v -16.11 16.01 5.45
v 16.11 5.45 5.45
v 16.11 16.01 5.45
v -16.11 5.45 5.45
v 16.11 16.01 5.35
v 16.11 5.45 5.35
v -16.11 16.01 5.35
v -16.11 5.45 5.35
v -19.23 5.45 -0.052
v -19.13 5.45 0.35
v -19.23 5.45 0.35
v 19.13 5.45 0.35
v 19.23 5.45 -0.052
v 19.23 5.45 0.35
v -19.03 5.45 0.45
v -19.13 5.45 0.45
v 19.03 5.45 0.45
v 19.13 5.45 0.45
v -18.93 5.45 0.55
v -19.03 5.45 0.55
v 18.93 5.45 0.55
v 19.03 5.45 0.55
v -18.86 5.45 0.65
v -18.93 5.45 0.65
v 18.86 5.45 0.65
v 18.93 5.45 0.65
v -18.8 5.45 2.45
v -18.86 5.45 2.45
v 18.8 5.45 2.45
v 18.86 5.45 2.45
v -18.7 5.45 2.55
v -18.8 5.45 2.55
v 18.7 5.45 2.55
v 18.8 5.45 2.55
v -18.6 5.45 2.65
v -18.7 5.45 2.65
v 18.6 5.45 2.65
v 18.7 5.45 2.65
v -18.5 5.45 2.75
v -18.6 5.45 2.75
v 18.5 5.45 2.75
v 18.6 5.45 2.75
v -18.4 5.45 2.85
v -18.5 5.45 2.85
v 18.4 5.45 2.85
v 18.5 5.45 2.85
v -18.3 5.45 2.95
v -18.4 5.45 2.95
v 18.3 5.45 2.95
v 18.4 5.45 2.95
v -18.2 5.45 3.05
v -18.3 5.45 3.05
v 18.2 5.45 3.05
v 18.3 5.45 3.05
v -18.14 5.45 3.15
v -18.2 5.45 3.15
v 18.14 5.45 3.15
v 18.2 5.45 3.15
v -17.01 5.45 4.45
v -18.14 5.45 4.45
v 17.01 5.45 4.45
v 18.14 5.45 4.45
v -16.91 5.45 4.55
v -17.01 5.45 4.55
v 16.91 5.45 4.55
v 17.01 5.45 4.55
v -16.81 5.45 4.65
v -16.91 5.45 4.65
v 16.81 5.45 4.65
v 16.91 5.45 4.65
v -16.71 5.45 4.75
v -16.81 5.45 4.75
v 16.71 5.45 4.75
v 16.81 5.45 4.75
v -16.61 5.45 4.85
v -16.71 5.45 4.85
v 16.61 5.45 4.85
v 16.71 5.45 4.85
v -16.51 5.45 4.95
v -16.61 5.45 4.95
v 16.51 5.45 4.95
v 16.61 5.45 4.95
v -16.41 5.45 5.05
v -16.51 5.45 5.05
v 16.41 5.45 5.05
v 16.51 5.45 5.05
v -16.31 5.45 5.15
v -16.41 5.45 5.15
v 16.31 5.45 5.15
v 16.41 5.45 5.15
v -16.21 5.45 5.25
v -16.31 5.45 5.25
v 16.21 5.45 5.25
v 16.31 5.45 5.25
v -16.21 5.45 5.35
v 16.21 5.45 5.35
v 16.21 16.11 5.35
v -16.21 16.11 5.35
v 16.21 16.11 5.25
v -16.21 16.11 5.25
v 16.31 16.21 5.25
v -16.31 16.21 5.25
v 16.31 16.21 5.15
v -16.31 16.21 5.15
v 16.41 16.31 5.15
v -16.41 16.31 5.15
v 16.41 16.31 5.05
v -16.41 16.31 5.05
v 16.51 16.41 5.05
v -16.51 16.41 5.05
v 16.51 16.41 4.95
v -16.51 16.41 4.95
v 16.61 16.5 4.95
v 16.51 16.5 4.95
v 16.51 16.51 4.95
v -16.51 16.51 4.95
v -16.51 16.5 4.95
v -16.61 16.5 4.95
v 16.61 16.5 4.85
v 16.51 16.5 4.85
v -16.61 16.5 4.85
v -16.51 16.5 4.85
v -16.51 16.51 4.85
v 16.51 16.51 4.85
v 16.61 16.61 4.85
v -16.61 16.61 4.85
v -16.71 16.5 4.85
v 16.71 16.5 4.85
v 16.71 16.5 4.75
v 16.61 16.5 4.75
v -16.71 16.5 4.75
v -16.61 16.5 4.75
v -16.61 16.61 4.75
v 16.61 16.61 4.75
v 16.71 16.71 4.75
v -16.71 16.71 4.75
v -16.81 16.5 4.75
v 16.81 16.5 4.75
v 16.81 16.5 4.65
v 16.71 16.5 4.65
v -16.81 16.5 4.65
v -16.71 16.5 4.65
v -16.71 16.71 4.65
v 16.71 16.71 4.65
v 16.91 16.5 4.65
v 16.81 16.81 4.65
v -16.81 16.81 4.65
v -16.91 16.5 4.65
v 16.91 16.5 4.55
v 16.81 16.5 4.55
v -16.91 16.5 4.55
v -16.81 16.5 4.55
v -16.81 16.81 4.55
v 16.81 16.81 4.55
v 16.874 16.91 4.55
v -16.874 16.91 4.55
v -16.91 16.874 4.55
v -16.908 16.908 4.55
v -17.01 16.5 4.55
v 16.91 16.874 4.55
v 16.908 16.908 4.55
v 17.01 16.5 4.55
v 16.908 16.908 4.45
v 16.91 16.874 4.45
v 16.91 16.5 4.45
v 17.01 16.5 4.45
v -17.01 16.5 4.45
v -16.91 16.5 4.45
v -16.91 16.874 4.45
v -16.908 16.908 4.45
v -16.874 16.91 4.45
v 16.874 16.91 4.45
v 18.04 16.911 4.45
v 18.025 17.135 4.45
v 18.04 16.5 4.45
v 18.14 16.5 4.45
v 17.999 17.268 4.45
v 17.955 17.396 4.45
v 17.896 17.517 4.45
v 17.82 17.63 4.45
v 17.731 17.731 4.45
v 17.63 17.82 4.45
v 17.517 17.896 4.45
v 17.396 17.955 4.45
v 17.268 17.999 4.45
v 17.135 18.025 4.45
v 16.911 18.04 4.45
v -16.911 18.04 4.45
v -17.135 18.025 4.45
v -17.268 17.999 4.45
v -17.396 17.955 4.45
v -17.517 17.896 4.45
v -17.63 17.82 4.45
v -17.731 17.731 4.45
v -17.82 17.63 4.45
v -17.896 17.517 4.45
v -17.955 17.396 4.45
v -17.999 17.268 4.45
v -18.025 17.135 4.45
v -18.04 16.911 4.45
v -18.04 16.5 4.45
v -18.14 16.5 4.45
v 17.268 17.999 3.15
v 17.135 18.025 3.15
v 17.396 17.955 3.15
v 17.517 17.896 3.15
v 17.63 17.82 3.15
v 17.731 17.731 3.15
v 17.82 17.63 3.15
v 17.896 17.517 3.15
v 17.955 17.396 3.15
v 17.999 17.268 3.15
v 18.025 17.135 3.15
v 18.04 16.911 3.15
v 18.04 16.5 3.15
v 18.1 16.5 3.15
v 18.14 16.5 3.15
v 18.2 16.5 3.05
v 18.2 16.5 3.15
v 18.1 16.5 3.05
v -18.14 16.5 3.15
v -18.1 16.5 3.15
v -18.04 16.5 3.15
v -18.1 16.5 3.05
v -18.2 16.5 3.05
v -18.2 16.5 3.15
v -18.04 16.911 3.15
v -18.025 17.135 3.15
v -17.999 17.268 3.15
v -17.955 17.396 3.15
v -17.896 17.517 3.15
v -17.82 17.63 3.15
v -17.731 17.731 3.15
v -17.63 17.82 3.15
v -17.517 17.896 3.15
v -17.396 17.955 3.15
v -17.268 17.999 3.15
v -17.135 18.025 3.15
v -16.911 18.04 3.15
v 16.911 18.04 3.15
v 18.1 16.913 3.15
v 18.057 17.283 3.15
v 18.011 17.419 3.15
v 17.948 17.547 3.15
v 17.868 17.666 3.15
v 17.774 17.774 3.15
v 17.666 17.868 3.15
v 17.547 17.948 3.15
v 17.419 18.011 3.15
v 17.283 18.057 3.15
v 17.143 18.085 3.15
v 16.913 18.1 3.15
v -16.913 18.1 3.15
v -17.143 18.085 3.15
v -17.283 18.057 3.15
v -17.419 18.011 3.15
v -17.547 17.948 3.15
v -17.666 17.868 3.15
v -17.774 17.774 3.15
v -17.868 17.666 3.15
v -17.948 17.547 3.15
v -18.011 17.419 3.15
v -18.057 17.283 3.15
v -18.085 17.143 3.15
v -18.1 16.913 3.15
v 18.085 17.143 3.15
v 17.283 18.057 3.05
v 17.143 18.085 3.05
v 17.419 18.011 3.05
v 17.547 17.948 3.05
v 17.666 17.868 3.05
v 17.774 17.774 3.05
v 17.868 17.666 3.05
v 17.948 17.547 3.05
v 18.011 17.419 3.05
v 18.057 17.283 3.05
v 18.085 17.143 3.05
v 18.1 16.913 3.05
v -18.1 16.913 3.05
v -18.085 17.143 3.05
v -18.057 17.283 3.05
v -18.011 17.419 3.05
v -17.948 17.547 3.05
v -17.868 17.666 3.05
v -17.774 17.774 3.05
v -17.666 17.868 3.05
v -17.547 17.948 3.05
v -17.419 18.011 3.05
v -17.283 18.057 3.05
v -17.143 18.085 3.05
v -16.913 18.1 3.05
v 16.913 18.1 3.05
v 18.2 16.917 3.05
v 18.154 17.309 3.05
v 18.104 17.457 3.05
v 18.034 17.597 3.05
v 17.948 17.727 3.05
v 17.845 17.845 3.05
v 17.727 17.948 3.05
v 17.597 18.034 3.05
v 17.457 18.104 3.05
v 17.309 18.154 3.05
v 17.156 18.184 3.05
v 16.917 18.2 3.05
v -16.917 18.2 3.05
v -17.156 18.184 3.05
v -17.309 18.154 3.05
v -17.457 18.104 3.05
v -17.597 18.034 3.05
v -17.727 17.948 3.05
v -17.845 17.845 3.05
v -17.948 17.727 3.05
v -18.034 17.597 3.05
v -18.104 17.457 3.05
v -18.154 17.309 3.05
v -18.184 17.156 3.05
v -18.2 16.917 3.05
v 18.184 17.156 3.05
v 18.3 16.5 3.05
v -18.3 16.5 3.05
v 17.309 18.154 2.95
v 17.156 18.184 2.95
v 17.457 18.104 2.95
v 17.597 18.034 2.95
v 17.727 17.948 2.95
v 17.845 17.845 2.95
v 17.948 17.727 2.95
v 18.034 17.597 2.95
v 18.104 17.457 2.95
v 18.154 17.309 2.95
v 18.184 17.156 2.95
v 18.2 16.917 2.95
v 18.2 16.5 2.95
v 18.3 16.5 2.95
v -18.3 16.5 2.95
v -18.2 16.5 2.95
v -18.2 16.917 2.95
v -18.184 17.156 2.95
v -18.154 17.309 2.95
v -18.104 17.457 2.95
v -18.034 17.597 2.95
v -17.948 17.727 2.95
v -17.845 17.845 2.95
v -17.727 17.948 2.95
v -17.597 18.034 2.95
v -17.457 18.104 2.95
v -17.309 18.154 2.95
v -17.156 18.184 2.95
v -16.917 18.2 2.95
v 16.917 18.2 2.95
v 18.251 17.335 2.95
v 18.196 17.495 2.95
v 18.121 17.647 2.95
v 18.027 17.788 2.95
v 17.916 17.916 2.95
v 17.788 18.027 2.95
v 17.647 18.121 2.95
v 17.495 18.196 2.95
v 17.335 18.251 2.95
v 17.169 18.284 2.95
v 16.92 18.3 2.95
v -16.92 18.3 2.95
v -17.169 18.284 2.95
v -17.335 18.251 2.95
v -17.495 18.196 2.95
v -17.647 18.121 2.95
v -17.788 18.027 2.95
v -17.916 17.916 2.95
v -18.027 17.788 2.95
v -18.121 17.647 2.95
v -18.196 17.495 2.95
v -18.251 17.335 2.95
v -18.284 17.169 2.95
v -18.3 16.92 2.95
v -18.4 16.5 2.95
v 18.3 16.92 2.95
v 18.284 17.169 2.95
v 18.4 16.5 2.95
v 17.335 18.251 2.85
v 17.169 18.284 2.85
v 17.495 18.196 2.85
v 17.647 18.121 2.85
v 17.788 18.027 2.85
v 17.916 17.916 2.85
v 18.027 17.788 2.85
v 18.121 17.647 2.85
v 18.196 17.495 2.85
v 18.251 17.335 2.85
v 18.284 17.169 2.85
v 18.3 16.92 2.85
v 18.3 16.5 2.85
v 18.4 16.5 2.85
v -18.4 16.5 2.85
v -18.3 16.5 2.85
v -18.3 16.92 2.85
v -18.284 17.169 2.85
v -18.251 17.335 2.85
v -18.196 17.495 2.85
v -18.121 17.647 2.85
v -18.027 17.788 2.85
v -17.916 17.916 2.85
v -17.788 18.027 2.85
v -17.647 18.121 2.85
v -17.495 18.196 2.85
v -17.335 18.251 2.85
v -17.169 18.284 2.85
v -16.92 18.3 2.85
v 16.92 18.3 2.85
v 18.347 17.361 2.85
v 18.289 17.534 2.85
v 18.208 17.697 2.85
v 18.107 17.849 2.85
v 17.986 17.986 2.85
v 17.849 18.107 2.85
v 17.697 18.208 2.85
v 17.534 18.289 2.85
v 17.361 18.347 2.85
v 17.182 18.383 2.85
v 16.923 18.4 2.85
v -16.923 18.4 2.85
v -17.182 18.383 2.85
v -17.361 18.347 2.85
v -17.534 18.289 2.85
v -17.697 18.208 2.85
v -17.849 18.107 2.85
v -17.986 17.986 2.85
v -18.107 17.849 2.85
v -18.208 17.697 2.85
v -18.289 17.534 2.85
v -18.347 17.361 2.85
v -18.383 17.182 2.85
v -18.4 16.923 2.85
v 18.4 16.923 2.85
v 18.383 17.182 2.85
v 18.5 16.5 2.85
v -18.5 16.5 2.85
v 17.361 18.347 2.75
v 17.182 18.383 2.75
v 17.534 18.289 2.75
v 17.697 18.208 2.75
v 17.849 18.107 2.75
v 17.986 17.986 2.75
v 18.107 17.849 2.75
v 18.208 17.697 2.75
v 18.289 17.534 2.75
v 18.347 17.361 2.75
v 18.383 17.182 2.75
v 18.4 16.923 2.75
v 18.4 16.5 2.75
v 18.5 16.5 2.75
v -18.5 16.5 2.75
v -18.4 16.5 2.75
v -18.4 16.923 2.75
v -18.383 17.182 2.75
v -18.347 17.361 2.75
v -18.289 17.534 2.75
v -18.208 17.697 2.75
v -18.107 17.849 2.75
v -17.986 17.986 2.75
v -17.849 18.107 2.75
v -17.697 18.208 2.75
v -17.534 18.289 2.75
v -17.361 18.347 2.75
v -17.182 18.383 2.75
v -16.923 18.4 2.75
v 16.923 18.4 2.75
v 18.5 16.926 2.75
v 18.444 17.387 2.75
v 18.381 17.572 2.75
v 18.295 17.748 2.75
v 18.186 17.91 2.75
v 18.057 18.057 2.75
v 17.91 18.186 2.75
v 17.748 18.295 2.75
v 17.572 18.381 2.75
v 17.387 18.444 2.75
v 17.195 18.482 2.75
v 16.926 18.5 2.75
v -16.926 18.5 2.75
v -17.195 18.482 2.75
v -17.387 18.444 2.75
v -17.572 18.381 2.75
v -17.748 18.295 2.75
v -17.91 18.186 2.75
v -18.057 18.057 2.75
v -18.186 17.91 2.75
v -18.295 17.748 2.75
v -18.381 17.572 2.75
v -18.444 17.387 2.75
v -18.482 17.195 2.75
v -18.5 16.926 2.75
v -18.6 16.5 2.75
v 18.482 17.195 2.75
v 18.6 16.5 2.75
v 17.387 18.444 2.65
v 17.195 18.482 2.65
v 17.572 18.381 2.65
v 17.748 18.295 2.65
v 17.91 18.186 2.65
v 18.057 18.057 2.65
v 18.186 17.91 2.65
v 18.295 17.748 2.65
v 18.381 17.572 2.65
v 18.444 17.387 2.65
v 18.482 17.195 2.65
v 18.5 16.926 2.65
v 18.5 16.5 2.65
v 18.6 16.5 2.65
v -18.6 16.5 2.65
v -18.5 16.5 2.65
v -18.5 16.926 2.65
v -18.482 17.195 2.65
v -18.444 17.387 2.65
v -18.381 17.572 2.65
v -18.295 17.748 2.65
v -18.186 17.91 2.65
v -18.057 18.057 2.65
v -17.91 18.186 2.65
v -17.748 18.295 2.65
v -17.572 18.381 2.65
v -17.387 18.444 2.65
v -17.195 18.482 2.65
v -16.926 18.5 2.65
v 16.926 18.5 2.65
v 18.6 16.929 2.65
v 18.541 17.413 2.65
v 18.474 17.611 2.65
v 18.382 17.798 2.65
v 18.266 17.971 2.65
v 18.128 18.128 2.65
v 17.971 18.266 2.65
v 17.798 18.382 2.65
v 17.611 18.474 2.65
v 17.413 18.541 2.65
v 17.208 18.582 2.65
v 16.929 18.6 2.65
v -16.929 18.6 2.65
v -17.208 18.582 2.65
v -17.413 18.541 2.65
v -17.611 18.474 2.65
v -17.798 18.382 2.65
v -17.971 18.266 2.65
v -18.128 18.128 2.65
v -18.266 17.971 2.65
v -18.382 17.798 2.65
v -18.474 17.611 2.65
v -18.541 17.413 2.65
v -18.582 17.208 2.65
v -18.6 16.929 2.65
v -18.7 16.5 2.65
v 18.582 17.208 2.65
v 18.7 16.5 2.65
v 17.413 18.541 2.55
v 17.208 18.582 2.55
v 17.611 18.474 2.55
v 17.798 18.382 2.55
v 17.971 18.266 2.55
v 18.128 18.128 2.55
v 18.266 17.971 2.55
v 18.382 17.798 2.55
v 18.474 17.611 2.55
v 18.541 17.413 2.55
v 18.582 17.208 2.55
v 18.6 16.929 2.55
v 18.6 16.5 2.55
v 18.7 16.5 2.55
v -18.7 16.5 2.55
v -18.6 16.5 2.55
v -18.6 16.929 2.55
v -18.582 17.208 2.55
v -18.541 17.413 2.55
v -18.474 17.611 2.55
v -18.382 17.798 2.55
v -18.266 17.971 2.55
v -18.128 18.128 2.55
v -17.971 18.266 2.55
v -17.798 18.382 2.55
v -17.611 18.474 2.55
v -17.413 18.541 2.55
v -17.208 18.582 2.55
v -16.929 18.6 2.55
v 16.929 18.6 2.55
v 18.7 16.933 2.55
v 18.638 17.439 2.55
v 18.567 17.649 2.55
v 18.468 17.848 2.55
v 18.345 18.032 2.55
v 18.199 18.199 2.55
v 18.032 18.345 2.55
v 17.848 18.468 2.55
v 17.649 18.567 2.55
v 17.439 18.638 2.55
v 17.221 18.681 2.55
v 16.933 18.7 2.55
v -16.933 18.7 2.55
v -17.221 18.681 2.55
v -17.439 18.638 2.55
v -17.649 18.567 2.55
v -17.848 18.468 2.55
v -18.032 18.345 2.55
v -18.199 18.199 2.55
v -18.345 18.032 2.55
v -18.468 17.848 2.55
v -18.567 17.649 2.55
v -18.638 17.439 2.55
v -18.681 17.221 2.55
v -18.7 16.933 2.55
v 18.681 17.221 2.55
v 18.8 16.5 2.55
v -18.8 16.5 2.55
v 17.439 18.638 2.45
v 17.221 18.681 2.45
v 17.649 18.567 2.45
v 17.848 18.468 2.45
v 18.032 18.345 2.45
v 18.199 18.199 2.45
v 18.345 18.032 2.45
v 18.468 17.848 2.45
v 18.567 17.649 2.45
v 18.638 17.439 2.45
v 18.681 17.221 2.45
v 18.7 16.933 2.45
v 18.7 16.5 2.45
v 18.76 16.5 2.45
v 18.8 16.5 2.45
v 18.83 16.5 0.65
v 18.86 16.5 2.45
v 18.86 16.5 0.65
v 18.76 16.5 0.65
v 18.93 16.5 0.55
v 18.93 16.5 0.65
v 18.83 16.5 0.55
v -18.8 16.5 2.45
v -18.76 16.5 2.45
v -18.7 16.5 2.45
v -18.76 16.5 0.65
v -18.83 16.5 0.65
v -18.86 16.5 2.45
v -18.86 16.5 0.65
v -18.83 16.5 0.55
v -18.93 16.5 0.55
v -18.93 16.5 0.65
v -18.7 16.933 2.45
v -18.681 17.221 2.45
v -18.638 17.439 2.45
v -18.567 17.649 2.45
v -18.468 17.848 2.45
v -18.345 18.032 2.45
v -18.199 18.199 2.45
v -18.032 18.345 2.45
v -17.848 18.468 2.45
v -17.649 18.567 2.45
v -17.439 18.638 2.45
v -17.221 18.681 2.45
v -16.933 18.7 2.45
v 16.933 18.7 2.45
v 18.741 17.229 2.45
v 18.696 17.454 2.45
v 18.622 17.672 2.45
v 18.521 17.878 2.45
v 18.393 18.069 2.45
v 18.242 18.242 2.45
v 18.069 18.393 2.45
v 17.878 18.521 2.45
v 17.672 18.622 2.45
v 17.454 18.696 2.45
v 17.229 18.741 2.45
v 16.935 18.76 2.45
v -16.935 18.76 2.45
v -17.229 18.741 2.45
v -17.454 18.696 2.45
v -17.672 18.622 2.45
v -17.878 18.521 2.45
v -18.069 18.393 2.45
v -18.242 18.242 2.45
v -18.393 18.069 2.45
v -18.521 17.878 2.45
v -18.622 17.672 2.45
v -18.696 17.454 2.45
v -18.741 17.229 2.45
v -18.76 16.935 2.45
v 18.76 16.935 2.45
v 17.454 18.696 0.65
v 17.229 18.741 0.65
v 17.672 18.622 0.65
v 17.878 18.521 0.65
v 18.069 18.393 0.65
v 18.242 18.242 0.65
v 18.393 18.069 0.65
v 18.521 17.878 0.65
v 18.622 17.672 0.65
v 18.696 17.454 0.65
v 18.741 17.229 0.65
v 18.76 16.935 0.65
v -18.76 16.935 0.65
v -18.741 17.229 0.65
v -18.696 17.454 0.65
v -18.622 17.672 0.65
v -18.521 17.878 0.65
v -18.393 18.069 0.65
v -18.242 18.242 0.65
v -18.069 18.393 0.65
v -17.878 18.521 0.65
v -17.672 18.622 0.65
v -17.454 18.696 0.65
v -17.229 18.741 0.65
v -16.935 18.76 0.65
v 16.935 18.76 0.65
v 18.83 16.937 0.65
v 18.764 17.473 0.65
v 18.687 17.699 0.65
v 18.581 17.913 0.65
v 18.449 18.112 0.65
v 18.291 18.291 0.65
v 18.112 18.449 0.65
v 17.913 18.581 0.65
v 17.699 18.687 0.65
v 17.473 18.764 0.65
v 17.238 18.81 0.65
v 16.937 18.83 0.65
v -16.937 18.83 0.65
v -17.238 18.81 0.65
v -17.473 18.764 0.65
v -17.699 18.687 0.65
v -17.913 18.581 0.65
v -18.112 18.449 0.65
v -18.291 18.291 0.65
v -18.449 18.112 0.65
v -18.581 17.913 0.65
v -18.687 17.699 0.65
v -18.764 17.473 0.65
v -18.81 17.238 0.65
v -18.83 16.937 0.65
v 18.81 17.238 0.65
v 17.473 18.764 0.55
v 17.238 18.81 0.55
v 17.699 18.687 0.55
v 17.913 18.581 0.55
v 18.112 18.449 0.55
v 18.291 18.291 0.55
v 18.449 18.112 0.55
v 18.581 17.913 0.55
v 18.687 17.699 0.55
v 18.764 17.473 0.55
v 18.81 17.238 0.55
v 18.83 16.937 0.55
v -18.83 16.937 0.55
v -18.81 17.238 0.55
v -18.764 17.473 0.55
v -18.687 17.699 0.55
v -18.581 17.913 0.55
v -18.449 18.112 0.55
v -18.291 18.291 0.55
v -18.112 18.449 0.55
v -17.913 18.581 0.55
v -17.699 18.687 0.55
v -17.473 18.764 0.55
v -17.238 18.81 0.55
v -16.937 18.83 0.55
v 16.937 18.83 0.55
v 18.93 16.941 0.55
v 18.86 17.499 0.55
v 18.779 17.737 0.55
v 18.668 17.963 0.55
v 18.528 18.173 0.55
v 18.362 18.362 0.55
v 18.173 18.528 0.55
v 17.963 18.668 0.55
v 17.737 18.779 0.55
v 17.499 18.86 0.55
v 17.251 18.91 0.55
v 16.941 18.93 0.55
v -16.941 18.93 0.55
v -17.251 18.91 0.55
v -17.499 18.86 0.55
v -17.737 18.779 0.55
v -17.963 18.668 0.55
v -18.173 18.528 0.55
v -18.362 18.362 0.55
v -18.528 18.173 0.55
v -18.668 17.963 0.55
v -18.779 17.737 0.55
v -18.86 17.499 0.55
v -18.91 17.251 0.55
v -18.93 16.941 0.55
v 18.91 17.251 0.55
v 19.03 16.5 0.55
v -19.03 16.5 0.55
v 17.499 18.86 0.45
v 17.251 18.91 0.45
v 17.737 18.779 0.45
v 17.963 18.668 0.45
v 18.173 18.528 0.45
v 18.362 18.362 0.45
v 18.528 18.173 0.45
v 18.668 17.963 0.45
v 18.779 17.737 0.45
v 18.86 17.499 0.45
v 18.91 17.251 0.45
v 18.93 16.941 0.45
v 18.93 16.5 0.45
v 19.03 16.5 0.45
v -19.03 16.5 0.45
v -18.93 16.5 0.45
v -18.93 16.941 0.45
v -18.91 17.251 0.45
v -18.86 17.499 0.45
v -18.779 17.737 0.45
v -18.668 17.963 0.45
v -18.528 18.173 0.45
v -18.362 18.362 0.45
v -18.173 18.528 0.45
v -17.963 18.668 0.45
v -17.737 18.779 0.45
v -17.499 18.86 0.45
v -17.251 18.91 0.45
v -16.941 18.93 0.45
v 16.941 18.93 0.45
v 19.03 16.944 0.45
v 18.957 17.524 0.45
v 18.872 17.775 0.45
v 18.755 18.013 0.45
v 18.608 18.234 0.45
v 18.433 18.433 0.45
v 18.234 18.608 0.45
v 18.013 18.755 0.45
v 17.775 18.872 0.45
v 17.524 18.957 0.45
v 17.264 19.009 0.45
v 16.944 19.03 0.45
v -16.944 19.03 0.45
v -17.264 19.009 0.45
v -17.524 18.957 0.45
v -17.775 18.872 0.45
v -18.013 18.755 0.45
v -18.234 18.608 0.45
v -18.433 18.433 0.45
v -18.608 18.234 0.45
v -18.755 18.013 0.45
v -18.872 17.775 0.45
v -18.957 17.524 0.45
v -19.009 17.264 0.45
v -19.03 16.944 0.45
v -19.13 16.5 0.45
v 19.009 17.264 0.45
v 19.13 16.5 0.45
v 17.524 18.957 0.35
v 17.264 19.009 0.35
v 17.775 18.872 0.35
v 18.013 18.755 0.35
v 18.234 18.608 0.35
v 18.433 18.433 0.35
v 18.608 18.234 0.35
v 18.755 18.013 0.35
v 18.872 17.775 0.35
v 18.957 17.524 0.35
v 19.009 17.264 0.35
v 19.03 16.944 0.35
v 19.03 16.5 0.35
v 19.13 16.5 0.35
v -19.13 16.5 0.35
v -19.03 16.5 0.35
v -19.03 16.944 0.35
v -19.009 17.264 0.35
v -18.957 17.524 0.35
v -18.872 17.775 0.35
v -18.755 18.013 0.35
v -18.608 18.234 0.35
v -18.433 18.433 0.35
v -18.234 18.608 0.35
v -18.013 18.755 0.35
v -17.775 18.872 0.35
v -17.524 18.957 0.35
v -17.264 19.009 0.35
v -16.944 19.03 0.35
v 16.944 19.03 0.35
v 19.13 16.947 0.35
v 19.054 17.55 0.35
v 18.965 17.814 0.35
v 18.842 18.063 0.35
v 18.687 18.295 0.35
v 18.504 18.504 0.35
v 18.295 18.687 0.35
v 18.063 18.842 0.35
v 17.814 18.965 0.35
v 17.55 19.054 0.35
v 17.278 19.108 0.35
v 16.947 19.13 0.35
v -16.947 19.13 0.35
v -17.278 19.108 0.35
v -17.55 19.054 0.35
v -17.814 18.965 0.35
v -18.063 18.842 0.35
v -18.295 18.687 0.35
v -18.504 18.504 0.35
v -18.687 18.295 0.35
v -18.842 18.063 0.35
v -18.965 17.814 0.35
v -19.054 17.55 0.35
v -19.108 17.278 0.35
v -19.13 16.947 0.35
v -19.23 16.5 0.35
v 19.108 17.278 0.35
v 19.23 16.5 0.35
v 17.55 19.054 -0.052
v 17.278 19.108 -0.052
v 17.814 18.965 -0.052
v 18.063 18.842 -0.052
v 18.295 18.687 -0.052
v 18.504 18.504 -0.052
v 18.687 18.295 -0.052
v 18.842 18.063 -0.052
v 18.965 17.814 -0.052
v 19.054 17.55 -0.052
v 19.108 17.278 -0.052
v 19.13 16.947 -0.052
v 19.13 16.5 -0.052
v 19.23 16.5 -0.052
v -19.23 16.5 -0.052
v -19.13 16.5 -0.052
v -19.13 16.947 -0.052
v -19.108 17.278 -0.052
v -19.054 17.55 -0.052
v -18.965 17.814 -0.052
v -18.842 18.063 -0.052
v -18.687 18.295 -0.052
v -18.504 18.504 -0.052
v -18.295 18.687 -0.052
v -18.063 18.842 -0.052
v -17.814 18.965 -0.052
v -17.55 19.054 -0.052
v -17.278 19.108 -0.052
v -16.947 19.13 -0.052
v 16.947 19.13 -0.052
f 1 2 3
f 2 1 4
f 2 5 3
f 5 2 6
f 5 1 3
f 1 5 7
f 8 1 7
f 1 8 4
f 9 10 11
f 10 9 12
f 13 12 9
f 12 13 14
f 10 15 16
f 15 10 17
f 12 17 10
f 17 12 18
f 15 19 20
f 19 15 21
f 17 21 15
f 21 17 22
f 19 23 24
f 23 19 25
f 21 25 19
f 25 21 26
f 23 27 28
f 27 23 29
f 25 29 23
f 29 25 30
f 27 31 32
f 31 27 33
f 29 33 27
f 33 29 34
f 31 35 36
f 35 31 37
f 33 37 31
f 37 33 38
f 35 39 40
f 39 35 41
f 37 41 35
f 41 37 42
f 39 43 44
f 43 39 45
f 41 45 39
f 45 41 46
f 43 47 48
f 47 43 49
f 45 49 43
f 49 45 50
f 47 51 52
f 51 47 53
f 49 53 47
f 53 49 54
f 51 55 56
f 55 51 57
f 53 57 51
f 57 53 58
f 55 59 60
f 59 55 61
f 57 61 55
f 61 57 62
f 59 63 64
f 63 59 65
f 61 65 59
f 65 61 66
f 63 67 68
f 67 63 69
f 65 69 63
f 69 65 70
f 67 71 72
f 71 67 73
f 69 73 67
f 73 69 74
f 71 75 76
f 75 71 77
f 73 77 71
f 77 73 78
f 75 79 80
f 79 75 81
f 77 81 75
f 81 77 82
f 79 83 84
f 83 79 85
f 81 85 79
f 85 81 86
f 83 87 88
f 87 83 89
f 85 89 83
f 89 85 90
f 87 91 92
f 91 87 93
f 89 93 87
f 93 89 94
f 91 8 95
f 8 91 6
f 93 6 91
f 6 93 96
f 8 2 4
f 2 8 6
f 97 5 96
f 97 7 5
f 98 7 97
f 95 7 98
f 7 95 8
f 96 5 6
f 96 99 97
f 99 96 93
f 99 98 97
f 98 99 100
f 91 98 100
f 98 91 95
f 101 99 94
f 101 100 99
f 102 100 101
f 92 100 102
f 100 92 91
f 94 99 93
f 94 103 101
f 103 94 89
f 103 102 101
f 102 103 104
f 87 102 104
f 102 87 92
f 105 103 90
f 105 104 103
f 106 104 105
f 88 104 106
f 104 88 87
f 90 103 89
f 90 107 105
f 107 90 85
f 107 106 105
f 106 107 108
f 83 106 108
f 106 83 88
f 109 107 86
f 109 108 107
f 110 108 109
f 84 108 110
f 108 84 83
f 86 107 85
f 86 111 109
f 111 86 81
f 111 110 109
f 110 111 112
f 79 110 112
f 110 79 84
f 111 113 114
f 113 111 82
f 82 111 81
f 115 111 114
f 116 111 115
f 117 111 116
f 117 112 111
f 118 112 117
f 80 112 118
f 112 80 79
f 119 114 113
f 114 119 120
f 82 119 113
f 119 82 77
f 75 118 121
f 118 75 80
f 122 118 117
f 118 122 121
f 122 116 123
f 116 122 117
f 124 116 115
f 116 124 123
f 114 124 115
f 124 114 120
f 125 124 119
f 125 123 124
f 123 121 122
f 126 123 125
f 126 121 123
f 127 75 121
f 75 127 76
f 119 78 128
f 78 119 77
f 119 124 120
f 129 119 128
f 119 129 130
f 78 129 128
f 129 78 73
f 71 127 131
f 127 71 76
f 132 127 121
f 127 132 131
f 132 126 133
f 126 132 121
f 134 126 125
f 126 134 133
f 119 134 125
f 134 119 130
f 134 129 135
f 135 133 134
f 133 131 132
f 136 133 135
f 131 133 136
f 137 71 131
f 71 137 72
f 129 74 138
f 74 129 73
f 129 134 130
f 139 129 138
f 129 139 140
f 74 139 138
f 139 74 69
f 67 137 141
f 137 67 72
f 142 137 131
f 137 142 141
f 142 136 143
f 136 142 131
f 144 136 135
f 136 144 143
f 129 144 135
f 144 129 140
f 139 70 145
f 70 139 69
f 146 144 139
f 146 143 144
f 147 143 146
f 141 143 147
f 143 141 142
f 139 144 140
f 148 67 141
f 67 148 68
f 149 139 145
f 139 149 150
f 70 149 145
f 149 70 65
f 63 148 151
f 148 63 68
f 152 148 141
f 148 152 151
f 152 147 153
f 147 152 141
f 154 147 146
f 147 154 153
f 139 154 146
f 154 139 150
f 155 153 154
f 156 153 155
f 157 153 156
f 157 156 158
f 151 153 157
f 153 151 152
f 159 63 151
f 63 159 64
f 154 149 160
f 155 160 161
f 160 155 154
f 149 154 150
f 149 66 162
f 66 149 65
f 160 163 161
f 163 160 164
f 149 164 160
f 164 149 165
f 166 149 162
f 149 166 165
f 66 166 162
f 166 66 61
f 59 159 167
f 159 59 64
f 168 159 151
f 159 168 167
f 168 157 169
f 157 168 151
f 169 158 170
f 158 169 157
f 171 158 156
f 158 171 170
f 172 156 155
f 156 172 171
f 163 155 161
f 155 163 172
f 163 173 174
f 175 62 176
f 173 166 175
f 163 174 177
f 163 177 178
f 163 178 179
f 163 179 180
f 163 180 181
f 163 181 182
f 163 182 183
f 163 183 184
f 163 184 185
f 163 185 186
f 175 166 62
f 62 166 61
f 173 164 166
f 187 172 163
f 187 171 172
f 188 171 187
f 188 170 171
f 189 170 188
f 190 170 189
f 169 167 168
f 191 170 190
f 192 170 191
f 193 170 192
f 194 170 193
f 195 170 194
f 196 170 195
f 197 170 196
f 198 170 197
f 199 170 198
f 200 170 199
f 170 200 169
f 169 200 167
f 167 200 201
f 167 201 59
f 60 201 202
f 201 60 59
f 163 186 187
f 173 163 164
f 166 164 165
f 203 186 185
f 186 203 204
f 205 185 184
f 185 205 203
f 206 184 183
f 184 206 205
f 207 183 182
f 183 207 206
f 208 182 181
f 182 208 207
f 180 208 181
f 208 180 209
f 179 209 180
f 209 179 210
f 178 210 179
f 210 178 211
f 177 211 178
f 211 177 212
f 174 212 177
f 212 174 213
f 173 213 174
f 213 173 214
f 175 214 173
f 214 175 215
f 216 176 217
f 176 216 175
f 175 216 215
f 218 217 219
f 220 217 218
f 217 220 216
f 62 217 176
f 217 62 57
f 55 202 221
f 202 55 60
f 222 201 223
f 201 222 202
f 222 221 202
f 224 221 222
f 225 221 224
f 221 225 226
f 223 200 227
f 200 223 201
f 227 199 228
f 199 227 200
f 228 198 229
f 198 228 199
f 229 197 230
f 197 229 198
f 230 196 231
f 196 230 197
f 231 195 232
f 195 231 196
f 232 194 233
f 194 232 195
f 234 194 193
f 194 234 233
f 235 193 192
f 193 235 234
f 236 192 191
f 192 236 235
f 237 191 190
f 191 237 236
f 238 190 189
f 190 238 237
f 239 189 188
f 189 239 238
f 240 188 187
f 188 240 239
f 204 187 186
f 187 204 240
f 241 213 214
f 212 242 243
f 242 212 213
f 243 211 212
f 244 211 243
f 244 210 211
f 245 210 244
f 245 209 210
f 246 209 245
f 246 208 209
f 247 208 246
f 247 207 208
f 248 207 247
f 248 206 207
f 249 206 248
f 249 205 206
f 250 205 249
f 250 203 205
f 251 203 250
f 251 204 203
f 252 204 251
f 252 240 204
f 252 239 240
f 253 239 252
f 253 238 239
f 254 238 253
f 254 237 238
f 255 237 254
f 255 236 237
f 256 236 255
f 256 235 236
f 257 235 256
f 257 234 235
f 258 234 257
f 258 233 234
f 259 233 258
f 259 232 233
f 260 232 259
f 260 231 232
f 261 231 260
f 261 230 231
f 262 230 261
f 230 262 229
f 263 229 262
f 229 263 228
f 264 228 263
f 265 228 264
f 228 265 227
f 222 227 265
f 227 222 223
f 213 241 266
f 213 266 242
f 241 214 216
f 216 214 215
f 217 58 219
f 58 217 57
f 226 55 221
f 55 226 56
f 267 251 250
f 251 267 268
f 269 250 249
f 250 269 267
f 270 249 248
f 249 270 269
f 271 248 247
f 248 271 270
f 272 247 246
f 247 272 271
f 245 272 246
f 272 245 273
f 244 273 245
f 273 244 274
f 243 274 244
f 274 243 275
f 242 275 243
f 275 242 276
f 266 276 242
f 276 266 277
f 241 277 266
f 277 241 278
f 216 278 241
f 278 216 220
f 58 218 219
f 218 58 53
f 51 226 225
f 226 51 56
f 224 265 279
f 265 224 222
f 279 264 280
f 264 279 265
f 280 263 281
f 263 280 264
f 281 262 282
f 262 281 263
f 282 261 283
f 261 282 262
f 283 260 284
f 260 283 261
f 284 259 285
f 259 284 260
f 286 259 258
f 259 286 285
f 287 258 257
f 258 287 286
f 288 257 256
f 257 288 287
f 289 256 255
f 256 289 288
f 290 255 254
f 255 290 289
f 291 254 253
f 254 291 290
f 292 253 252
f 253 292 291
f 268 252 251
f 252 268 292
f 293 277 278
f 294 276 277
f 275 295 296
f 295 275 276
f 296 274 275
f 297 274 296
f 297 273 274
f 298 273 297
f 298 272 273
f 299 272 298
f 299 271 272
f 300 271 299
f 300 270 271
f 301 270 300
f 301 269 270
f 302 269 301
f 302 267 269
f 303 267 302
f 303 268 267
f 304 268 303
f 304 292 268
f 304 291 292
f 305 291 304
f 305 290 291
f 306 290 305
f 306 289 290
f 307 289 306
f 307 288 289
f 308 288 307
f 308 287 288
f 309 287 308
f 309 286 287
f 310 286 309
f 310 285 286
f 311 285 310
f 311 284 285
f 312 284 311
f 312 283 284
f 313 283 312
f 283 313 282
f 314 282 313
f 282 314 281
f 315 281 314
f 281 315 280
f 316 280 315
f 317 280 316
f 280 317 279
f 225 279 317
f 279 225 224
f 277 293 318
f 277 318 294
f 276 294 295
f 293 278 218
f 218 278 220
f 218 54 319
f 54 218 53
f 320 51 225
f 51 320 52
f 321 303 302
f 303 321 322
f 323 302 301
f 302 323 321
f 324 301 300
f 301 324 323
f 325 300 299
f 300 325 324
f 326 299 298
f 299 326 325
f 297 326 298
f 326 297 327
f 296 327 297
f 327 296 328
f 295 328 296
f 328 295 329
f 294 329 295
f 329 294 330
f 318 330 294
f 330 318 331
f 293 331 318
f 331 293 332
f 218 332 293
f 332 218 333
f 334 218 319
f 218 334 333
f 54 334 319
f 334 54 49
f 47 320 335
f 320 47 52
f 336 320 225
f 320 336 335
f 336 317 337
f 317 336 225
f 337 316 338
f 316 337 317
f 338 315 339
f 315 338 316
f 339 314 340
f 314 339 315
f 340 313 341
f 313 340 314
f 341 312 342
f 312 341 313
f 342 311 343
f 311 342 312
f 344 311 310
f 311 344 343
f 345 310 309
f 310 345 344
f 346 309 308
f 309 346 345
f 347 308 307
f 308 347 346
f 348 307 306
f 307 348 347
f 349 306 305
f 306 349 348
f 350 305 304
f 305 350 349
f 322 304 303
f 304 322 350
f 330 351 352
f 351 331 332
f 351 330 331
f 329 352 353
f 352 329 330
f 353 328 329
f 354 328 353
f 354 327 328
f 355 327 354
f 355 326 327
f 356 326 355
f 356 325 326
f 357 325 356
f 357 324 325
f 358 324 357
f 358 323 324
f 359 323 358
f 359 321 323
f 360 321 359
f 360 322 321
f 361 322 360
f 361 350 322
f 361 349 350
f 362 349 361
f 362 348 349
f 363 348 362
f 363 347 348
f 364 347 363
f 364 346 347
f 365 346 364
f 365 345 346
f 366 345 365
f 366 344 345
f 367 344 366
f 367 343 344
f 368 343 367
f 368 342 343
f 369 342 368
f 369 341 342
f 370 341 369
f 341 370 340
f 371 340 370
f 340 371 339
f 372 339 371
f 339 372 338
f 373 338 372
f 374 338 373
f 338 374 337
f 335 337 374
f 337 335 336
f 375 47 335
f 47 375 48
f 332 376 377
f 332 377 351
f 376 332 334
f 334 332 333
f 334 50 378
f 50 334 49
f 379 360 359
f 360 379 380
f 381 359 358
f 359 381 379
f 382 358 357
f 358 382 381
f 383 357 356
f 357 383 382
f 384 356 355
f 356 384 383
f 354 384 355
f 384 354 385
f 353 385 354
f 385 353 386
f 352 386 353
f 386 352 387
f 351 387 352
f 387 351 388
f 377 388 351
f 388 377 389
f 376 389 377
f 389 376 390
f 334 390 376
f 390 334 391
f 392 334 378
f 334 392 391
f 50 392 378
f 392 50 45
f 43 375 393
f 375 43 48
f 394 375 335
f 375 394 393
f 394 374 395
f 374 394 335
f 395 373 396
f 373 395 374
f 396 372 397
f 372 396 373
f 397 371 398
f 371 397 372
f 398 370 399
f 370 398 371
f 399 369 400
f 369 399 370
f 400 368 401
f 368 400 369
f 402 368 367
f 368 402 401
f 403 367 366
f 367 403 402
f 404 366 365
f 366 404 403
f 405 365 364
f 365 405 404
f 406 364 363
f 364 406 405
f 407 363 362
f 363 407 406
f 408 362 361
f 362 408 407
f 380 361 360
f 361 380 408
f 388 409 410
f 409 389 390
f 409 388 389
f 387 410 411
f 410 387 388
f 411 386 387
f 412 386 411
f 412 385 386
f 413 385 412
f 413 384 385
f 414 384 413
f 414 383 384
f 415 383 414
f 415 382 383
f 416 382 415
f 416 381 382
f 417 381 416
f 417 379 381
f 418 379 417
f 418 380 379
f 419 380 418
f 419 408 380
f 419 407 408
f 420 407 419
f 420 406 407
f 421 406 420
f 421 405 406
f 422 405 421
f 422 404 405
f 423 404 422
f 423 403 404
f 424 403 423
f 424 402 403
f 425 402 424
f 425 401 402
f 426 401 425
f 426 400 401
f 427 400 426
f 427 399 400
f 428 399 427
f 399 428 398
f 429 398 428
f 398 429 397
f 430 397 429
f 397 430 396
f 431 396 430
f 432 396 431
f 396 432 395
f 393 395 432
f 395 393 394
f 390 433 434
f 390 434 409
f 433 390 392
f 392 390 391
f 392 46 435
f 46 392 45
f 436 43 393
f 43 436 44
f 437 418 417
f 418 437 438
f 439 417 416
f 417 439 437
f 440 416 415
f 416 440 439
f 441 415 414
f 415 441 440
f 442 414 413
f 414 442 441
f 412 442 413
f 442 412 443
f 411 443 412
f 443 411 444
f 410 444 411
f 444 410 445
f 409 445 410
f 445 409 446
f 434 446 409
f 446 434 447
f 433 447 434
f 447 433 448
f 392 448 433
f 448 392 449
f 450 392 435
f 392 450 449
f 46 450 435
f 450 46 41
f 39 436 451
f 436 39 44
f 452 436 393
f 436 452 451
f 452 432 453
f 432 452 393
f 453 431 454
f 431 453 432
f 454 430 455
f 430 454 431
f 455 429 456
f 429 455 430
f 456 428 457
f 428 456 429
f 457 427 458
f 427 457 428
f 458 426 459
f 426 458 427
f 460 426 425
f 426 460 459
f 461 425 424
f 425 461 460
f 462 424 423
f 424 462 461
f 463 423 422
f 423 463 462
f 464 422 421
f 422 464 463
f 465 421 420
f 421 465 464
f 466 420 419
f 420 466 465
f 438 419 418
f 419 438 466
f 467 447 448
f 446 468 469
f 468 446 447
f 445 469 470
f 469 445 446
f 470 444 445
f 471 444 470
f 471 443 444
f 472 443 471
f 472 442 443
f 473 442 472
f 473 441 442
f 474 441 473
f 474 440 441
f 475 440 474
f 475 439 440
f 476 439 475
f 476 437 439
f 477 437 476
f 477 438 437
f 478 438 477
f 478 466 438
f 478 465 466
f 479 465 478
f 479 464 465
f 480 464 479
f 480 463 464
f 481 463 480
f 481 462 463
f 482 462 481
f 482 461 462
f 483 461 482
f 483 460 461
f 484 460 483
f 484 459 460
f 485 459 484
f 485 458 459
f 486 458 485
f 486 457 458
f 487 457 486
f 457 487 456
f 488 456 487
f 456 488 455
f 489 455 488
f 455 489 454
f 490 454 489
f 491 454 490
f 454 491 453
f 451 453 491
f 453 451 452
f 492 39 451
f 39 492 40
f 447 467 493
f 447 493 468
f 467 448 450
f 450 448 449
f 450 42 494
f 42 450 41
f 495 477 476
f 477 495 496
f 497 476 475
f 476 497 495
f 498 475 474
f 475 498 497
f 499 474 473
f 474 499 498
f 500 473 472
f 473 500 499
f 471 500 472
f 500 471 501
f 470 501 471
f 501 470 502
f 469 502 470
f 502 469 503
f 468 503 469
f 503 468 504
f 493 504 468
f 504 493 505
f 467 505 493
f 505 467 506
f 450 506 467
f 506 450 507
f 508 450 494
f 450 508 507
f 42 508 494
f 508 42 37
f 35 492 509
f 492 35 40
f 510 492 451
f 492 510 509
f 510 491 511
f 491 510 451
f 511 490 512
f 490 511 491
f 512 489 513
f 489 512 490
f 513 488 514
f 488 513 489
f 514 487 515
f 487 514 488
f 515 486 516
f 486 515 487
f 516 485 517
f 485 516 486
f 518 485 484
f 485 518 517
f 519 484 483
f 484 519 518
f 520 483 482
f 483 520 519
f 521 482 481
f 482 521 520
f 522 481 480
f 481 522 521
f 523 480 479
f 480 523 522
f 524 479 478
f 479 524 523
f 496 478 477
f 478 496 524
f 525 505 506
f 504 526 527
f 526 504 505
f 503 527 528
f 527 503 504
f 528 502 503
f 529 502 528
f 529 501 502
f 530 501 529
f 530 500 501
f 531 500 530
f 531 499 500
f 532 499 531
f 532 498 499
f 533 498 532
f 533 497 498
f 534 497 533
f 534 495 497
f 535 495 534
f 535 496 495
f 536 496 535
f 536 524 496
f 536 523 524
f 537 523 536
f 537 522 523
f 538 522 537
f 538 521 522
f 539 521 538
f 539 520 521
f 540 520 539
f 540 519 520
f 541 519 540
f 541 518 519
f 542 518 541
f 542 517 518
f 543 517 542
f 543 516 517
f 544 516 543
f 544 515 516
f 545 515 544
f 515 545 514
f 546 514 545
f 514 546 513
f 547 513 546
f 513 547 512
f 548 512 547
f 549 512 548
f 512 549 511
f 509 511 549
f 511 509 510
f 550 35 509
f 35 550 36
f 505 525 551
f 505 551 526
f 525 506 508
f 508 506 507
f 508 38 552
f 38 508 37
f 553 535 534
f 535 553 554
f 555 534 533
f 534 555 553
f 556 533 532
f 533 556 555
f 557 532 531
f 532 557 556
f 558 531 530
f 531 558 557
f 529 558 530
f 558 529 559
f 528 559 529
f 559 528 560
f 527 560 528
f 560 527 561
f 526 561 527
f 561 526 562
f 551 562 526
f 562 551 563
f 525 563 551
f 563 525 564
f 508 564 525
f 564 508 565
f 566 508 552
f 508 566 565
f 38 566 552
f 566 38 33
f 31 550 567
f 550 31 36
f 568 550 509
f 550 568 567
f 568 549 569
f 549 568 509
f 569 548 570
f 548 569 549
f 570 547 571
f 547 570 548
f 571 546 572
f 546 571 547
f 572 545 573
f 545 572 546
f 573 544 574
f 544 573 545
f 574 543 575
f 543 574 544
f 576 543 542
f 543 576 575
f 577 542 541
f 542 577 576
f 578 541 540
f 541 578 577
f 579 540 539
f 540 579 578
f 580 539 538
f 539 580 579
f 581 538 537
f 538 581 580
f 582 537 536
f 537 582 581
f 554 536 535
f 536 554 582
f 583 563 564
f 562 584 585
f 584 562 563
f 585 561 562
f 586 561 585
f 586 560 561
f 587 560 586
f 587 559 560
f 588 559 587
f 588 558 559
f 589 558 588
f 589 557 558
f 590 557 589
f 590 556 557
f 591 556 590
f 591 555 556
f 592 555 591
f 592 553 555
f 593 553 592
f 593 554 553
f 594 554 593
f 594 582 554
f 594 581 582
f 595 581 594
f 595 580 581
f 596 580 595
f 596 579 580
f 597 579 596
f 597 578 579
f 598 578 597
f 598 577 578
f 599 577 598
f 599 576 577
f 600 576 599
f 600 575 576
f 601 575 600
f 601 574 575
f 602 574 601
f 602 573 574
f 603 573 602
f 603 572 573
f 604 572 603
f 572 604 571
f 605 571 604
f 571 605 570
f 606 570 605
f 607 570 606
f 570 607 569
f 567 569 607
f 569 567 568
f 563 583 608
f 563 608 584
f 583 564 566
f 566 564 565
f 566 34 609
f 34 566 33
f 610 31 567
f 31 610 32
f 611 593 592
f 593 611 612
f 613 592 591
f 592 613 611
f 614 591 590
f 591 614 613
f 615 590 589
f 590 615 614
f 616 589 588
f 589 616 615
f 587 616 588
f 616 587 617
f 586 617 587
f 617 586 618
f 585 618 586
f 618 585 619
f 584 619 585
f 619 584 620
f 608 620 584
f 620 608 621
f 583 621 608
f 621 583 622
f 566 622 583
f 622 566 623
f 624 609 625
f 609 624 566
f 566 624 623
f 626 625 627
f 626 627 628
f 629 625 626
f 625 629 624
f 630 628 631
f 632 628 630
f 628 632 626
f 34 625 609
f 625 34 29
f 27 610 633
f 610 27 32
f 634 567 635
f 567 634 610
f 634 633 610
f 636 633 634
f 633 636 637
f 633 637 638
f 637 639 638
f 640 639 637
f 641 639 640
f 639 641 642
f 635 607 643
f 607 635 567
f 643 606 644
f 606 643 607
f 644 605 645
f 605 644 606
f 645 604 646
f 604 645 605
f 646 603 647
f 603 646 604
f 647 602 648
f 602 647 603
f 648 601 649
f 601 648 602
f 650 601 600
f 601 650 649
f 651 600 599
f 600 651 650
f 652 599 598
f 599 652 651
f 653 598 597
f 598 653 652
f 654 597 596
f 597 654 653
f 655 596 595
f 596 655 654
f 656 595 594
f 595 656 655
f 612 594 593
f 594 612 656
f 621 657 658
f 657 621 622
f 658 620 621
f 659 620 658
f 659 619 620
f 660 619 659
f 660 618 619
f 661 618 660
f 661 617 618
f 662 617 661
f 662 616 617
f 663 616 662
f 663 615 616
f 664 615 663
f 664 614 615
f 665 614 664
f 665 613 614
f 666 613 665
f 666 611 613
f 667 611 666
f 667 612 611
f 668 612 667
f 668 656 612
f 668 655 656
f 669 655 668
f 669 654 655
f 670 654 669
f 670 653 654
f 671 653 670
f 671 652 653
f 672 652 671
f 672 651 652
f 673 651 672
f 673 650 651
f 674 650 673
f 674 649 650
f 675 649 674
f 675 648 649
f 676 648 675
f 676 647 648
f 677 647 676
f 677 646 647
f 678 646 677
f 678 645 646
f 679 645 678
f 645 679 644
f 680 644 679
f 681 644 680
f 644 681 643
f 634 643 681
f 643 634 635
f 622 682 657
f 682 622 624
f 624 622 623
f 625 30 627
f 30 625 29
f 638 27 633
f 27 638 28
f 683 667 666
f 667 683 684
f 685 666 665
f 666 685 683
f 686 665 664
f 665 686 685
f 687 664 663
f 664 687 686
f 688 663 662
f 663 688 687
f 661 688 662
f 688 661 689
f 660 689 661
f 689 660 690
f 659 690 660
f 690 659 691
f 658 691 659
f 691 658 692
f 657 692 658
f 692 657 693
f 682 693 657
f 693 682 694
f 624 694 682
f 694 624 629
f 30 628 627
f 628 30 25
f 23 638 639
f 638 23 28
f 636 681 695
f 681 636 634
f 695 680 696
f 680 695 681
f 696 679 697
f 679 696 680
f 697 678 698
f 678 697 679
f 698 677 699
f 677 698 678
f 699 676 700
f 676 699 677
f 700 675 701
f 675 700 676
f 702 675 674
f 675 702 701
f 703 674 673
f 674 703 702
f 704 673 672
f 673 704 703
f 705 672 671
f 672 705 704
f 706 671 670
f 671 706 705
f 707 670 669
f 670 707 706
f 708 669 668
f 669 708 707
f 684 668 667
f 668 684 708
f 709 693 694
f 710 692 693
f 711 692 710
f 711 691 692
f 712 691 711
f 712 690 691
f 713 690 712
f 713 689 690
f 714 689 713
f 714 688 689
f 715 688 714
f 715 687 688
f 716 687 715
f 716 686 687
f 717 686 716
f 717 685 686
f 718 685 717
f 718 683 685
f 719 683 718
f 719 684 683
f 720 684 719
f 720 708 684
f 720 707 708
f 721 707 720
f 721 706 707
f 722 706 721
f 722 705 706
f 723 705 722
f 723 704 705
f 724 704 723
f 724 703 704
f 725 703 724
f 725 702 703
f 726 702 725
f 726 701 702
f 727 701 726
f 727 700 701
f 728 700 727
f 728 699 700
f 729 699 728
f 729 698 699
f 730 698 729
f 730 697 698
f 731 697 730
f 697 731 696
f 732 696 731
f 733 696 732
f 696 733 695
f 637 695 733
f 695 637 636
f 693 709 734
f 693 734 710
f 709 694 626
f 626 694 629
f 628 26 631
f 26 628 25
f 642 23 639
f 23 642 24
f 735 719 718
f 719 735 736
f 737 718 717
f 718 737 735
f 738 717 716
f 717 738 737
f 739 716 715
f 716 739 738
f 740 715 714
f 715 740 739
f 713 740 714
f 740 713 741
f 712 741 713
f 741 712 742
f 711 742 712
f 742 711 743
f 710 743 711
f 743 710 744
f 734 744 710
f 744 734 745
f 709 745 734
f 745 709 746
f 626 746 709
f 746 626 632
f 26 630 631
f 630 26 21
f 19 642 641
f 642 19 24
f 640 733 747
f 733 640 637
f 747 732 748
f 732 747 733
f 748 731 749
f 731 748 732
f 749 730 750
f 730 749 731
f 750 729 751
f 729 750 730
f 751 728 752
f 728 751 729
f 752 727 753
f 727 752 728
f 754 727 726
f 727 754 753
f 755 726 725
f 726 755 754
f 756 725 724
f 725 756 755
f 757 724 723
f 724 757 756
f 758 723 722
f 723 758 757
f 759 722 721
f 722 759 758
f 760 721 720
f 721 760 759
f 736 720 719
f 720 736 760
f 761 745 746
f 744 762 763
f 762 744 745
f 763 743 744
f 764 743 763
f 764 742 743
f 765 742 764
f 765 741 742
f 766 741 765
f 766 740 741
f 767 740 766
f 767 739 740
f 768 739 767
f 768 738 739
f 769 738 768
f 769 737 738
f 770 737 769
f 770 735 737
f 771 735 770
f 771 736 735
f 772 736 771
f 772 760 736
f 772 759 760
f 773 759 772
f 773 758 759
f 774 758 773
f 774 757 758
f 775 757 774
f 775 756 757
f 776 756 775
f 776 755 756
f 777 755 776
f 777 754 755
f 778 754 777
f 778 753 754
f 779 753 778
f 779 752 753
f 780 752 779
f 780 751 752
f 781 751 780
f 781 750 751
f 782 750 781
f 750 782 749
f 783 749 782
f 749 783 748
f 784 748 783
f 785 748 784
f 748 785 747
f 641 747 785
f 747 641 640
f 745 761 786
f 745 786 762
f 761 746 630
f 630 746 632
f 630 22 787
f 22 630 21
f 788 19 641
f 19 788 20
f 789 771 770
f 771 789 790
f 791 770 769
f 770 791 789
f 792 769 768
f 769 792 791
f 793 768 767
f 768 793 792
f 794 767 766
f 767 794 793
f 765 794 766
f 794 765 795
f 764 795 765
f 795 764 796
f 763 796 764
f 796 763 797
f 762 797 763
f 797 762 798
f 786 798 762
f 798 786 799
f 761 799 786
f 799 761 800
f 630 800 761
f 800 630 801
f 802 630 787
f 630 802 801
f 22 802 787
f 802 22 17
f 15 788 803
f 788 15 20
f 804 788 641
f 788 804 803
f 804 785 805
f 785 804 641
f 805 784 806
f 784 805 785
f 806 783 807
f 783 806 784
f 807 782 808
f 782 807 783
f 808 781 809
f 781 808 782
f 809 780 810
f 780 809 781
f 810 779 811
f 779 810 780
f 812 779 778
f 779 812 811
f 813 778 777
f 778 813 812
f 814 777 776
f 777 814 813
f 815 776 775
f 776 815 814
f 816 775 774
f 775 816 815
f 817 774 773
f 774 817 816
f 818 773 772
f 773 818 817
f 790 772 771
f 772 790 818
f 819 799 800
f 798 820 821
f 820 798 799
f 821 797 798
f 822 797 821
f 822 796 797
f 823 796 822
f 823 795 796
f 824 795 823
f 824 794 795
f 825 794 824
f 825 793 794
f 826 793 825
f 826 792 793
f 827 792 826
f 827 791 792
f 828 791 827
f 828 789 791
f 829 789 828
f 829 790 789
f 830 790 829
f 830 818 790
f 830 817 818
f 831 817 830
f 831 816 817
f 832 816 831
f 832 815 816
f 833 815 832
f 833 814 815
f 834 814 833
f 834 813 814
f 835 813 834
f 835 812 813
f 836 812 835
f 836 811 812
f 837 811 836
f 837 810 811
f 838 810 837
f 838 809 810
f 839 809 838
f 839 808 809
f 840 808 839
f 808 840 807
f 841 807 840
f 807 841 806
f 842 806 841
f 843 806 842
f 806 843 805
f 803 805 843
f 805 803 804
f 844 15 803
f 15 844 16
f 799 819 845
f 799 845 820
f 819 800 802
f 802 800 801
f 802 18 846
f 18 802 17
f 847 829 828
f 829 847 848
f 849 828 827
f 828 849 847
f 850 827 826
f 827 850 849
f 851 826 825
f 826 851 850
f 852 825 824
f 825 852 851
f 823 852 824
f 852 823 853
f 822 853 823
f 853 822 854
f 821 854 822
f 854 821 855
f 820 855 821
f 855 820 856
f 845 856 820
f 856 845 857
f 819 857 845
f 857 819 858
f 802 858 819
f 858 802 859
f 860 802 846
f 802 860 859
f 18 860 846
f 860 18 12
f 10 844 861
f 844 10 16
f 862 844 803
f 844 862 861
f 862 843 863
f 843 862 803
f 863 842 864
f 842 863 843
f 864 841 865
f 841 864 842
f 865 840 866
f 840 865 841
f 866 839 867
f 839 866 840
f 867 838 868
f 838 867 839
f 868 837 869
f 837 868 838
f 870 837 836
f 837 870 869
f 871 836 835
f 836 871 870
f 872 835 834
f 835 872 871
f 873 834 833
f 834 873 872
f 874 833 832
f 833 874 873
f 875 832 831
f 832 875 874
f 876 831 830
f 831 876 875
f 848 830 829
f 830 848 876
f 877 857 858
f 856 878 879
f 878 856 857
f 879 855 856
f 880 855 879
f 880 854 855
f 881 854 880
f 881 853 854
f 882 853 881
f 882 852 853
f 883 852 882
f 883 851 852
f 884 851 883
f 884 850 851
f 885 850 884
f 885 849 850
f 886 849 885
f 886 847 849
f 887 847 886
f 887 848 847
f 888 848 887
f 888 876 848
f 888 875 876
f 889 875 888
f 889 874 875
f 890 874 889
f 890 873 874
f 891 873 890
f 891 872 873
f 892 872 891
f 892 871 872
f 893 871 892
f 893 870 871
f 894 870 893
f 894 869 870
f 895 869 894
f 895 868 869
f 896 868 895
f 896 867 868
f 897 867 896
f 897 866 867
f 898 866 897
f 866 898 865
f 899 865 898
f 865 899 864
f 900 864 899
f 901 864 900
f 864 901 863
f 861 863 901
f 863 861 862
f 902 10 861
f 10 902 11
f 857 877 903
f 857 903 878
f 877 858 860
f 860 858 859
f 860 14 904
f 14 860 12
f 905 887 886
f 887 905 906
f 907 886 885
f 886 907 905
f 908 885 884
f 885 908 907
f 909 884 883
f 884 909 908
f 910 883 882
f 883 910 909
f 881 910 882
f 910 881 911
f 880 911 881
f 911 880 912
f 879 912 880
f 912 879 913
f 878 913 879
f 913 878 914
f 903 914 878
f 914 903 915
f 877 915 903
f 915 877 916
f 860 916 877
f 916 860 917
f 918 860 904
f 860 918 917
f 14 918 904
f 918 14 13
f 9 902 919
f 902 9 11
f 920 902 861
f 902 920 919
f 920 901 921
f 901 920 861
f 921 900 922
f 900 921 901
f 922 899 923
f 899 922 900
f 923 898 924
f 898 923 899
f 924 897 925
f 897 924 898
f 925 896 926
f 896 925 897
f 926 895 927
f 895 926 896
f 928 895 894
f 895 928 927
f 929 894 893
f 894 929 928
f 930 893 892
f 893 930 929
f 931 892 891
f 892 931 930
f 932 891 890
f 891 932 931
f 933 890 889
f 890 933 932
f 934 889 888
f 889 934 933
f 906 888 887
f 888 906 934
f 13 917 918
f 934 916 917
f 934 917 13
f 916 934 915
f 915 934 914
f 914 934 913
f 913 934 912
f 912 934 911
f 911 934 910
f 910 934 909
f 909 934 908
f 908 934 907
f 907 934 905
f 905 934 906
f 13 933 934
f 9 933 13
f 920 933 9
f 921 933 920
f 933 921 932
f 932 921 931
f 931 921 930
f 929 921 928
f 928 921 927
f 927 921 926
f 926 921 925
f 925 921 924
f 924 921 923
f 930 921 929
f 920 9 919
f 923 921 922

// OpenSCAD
// Lip plug label for light bins without the flex groove (2026-11-02; after the MakerWorld "Gridfinity Snap-In
// Label", which fits our lip to 0.05 mm): a solid block in the front of the lip, from side wall to side wall, its front
// following the lip's inner face down to the bulge, so it sits on the bulge's 45 deg shoulder and cannot drop in; its
// ends press on the side walls' lip by fit / 2 each (the bendy walls hold it). It fills the stacking zone: nothing
// stacks on a bin with a plug. Labels the full width, so for 1- and 2-wide bins.
//
// Lip (scad/label_clip.scad; y inwards from the outer face, z down from the lip top): 0.69 at the top, 45 deg to 1.91
// at -1.22, vertical to -2.99, 45 deg to the bulge 2.63 at -3.71, vertical to -4.94, then back to the wall underneath.
//
// Printed upside down: the top face (text cut into it) on the bed.
//   openscad -D cells=1 -D fit=0.2 -o lip-plug-1.stl lip_plug.scad
// DejaVu Sans: from the system fonts (fonts-dejavu in the OpenSCAD image)

cells = 1;           // bin width in cells
fit = 0.2;           // press fit at the side walls (total)
clr = 0.08;          // gap to the front wall's lip
depth = 15.3;        // inner edge from the outer face
top = -0.55;         // top face below the lip top
bottom = -6.0;       // body bottom (inside the bulge)
txt = "";
txt_size = 6;
txt_depth = 0.4;
EF = 0.3;            // bed edge chamfer
print = true;

$fn = 48;
R = 3.75;
DZ = 0.1;
BW0 = 42 * cells - 0.5; BD = 42 - 0.5;
BW = BW0 + fit;      // follow the lip of a bin this much wider: the ends press by fit / 2

module outline() { offset(r = R) offset(delta = -R) square([BW, BD], center = true); }
module outline0() { offset(r = R) offset(delta = -R) square([BW0, BD], center = true); }
// the lip's inner face at depth z, plus clr; under the bulge the body steps in to 3.75 and chamfers to the bottom
function lip(z) = z >= -1.22 ? 0.69 - z : z >= -2.99 ? 1.91 : z >= -3.71 ? 1.91 + (-2.99 - z) : 2.63;
function yf(z) = z >= -4.96 ? lip(z) + clr : 3.75 + (-4.96 - z);

// the bed edge (top face) chamfered by EF against elephant foot
function ye(z) = yf(z) + max(0, EF - (top - z));
// press only on the straight side walls: the bin's corners do not give (2026-11-03: the 2-wide fit 0.2 would not go in)
module slice(z) {
  intersection() {
    union() {
      offset(r = -ye(z)) outline0();
      intersection() { offset(r = -ye(z)) outline(); translate([-BW, -BD / 2 + R + 0.5]) square([2 * BW, BD]); }
    }
    translate([-BW0, -BD / 2]) square([2 * BW0, depth]);
  }
}

module plug() {
  difference() {
    for (z = [bottom : DZ : top - DZ / 2]) translate([0, 0, z]) linear_extrude(DZ + 0.002) slice(z + DZ / 2);
    // the lip is flat at the top over each joint (7.6 wide, to 1.91 at -1.1 to -0.5): a notch there
    for (j = [1 : 1 : cells - 1]) translate([-BW0 / 2 - 0.25 + 42 * j - 4.2, -BD / 2 - 1, -1.35]) cube([8.4, 1 + 1.91 + clr + 0.1, 2]);
    if (txt != "") translate([0, -BD / 2 + (yf(top) + depth) / 2, top - txt_depth]) linear_extrude(txt_depth + 0.01)
      text(txt, size = txt_size, font = "DejaVu Sans", halign = "center", valign = "center");
    // the same mark in the bottom face (up when printed, hidden in the bin), so it shows in the slicer and on the plate
    // (the bed-face mark can't be seen in an STL viewer)
    if (txt != "") translate([0, -BD / 2 + (yf(bottom) + depth) / 2, bottom - 0.01]) linear_extrude(txt_depth + 0.01)
      mirror([0, 1]) text(txt, size = txt_size, font = "DejaVu Sans", halign = "center", valign = "center");
  }
}

if (print == true) rotate([180, 0, 0]) translate([0, 0, -top]) plug(); else if (print == false) plug();   // print = false: seated, z 0 at the lip top
